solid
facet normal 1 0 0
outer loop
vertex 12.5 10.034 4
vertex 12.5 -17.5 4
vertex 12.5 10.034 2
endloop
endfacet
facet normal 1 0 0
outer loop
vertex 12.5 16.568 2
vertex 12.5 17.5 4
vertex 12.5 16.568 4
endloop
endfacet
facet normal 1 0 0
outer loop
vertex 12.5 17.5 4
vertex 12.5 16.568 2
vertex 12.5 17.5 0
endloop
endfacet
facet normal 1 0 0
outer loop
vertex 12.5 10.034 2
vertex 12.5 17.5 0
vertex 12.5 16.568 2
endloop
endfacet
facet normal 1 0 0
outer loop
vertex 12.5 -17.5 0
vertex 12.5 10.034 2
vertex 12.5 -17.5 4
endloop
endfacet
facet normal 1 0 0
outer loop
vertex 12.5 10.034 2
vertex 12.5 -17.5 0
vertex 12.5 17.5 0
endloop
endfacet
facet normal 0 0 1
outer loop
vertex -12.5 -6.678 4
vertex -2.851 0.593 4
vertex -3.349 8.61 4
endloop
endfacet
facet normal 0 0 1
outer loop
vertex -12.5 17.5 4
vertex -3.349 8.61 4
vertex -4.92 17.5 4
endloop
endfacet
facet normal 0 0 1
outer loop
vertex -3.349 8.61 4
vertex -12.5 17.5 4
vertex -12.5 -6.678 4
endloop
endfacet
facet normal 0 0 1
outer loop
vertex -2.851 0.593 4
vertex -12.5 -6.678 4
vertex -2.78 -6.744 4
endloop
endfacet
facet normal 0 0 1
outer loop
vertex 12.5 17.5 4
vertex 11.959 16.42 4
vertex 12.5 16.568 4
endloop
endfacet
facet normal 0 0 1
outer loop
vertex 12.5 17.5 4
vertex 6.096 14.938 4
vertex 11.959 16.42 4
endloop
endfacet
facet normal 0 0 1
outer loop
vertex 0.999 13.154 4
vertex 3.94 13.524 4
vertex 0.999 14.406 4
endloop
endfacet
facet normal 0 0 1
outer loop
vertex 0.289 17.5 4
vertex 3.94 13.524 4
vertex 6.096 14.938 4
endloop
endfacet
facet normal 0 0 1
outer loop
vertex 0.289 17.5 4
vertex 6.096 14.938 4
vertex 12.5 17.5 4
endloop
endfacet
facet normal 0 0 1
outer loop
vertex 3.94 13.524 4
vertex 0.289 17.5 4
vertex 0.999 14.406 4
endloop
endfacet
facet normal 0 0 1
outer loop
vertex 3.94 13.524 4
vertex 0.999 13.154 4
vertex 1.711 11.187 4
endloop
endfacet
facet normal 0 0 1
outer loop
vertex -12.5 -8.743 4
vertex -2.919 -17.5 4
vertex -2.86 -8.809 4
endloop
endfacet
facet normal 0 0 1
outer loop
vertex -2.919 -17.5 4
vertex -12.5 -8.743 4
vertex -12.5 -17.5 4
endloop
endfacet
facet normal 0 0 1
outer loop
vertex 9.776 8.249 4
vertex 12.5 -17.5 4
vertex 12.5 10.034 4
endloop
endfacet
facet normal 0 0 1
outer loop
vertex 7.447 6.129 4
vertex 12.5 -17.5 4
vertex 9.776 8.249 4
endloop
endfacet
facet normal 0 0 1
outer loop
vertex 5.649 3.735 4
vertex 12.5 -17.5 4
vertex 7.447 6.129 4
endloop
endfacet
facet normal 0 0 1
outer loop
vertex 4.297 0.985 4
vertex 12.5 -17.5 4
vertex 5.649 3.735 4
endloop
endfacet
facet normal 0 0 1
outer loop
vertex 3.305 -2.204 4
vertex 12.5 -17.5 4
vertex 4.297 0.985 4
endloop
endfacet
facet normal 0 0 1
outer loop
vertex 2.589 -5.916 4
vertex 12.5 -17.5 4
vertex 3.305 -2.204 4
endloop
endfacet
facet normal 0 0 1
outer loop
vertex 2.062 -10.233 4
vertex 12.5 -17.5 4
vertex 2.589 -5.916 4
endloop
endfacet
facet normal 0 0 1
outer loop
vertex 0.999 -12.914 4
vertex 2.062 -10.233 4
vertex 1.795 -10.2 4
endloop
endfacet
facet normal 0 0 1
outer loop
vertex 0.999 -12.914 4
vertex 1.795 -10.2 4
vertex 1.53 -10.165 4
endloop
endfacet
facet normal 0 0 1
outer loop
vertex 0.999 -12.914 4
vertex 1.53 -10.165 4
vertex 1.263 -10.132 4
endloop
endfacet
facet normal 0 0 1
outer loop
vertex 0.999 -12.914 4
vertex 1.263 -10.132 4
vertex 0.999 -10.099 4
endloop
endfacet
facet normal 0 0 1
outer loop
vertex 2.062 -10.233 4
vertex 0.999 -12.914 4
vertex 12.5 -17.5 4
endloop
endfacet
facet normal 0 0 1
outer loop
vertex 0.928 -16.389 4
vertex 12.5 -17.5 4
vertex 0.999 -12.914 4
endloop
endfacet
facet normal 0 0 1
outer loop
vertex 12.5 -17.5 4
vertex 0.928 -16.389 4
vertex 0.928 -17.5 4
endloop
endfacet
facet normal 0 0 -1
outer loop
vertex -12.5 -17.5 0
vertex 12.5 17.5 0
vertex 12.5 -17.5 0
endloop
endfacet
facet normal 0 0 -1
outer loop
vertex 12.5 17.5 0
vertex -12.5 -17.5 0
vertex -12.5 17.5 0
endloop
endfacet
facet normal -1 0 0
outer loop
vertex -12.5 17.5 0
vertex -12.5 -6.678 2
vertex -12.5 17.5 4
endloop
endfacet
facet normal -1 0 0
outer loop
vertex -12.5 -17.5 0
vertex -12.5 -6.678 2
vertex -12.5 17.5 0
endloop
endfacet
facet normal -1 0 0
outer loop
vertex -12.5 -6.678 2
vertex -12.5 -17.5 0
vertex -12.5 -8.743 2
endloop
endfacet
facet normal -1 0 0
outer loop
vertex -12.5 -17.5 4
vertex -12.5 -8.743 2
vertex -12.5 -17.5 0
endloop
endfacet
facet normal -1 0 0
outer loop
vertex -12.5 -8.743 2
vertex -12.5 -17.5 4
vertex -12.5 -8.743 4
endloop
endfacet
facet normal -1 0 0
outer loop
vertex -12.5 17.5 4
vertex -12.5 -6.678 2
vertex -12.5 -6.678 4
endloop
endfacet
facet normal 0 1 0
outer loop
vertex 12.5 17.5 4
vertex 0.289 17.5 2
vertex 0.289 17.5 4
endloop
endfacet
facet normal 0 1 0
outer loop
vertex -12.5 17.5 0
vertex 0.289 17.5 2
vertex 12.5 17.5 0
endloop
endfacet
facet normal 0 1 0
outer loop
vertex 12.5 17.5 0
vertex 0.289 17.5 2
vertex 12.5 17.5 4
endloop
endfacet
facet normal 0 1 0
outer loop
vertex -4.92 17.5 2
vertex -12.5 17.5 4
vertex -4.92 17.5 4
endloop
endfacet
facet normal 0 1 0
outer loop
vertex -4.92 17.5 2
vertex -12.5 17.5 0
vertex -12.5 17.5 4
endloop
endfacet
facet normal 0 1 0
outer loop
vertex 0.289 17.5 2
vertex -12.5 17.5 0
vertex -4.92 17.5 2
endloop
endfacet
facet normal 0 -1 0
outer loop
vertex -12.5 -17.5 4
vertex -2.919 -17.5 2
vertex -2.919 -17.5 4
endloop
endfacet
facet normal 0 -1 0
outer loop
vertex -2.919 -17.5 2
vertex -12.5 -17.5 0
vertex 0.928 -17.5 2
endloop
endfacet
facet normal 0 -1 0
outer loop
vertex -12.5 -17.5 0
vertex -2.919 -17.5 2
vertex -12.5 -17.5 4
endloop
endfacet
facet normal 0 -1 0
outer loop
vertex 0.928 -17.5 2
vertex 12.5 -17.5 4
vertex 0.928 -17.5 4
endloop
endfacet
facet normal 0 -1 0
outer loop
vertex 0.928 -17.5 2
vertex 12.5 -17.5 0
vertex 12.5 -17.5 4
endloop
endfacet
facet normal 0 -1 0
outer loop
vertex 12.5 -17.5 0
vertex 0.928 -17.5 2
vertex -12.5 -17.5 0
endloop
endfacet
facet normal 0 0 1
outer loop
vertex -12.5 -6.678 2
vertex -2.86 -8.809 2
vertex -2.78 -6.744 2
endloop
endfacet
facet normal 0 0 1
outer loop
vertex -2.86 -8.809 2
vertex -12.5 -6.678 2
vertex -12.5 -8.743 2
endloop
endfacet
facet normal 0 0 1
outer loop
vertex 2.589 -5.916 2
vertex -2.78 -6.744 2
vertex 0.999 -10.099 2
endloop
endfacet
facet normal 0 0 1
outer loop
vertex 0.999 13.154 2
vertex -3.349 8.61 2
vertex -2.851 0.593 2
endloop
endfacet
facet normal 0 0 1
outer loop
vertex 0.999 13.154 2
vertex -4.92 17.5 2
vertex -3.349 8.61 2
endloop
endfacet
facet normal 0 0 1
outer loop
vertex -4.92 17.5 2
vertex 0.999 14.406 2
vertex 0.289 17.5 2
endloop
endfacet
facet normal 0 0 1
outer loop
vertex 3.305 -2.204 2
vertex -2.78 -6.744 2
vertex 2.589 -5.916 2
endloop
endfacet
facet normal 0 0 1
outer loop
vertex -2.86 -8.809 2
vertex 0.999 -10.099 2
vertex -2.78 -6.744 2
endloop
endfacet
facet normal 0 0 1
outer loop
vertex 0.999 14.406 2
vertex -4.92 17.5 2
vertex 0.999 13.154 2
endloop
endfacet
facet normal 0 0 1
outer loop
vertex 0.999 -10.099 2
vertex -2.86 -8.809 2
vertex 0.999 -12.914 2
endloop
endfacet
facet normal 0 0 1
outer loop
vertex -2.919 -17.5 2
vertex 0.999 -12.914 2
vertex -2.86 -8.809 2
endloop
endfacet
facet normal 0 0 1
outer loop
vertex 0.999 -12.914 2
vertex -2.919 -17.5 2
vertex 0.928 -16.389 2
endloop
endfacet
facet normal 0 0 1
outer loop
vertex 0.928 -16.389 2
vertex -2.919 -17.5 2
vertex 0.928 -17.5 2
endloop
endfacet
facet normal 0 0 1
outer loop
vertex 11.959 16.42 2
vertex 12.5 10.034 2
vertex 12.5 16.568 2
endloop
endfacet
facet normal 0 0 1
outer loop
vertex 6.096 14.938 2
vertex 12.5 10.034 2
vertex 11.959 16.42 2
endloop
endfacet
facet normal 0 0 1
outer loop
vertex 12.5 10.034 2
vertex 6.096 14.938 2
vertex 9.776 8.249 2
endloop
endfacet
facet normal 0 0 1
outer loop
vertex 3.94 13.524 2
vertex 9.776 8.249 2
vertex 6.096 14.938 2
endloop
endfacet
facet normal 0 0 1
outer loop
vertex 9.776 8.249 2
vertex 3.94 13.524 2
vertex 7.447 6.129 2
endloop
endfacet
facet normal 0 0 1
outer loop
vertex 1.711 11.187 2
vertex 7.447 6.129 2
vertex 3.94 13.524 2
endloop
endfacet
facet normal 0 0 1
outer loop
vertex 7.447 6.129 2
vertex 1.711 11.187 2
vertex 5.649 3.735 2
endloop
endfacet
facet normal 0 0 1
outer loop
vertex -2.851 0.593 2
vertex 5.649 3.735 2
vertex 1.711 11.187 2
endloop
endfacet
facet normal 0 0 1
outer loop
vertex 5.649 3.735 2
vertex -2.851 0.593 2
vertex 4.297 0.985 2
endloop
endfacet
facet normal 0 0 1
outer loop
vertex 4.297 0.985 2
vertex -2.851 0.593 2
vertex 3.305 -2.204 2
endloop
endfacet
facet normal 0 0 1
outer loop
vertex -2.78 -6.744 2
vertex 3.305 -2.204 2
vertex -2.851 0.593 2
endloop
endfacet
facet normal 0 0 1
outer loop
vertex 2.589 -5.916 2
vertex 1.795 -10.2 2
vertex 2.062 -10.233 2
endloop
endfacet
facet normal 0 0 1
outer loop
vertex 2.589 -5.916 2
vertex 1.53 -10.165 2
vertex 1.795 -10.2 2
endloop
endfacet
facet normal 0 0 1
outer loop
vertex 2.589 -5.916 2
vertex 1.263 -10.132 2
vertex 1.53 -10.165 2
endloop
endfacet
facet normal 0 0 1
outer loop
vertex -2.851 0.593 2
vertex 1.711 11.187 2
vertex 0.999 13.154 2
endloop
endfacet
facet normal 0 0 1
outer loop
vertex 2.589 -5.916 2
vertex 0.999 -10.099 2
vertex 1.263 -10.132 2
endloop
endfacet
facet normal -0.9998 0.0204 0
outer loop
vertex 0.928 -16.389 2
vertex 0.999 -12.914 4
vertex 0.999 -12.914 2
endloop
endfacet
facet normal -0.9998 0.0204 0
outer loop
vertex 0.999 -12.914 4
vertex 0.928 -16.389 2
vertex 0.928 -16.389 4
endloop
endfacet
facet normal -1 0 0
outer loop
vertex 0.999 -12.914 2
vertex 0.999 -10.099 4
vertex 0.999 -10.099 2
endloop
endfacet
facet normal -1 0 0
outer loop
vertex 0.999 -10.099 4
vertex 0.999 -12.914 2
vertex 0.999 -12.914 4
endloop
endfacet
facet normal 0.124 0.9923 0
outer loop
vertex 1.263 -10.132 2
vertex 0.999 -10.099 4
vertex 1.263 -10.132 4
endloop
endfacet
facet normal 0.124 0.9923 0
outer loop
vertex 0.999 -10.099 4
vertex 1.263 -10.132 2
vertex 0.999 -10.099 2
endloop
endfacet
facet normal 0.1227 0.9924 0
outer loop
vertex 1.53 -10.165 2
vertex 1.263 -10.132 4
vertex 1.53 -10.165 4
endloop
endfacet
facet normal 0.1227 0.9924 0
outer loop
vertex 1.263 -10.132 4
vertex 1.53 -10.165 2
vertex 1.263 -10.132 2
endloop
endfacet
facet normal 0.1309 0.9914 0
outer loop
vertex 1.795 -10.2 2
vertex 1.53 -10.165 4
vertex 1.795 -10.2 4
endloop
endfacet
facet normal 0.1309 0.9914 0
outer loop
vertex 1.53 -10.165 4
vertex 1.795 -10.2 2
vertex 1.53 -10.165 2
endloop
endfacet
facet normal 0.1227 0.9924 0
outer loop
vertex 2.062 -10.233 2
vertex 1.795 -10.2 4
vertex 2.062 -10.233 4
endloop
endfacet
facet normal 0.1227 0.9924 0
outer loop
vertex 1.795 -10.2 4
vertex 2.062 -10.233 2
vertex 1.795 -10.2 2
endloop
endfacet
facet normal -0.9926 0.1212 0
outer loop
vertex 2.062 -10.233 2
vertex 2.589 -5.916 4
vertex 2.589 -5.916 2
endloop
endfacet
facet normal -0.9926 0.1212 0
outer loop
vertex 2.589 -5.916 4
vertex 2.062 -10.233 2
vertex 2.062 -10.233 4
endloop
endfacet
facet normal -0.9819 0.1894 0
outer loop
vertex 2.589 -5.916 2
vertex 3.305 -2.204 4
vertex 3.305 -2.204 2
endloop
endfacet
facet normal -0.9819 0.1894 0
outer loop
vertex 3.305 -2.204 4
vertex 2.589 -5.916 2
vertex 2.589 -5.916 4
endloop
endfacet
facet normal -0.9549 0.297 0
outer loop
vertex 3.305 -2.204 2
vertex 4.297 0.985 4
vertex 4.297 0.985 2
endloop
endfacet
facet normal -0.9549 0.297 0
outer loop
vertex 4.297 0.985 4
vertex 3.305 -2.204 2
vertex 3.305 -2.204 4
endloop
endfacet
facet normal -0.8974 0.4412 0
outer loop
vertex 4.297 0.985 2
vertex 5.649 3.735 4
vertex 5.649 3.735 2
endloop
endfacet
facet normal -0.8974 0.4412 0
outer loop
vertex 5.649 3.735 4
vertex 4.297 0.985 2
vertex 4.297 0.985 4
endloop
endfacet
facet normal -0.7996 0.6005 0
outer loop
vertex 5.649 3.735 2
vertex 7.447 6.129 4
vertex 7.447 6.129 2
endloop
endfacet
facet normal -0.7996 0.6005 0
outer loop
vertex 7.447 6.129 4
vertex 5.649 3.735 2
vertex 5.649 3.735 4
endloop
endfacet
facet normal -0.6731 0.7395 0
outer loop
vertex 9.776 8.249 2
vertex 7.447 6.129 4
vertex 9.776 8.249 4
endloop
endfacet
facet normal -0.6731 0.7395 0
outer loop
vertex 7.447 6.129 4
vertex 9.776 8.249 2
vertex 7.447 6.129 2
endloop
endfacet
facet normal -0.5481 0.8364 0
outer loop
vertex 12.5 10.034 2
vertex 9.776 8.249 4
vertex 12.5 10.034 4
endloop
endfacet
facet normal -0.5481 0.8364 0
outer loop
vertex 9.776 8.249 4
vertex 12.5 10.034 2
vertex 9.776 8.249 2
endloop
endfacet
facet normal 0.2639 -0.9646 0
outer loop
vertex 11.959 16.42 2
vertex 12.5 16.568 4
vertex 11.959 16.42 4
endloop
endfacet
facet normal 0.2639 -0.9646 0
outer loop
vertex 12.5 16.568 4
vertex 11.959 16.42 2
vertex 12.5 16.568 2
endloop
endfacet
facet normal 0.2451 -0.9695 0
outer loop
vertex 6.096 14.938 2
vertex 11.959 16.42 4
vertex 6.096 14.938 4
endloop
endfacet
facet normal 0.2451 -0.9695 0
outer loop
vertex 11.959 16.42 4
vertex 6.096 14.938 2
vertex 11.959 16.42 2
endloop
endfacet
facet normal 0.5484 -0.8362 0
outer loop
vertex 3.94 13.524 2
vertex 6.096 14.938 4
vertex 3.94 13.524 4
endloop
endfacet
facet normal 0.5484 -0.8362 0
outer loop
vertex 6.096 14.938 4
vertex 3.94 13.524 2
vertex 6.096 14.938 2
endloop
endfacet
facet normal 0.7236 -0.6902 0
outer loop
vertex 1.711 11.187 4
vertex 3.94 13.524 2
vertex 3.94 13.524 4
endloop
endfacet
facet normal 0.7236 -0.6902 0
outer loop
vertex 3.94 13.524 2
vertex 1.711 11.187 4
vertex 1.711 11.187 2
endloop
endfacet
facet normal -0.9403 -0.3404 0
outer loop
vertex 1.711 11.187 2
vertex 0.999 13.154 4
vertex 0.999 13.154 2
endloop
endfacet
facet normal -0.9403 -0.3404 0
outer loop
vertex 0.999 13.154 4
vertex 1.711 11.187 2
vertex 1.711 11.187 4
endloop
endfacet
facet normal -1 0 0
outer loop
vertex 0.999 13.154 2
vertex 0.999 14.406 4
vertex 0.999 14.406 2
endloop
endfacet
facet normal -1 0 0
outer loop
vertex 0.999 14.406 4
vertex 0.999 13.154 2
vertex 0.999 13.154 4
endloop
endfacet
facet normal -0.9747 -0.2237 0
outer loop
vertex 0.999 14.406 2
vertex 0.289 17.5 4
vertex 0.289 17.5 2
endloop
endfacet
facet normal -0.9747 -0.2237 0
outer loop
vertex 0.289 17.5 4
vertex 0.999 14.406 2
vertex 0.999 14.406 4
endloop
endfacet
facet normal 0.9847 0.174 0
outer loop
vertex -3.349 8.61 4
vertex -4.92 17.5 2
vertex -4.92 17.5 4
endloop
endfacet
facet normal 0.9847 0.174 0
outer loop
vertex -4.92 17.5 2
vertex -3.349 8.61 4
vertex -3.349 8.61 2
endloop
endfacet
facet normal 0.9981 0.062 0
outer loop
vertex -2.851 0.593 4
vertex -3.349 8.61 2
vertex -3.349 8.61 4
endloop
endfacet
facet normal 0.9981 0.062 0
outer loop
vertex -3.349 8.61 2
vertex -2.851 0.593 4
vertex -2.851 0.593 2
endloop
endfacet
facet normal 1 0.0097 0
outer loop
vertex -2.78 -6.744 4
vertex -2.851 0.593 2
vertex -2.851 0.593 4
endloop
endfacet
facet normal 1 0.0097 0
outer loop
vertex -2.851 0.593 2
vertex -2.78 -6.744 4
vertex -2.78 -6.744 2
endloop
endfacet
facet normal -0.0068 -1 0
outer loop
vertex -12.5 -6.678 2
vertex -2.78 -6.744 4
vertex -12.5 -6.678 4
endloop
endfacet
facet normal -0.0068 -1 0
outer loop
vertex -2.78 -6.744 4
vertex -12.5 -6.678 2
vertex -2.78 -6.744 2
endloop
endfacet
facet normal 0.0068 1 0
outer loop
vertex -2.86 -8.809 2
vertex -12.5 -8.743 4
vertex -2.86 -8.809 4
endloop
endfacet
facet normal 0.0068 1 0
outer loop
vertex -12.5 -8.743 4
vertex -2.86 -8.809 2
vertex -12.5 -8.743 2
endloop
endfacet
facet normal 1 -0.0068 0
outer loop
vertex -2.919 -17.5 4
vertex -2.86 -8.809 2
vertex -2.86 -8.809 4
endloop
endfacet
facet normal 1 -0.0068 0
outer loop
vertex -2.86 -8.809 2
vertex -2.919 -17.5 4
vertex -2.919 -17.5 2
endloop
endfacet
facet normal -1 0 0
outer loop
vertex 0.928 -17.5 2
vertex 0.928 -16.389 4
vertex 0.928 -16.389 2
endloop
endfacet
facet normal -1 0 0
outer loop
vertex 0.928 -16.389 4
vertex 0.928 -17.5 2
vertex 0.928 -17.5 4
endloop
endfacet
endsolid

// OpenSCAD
difference() {
translate([0,0,2]) cube([25,35,4],center=true); 
translate([0,-5,2]) scale(0.25) linear_extrude(height = 40) import("test3.dxf");}
